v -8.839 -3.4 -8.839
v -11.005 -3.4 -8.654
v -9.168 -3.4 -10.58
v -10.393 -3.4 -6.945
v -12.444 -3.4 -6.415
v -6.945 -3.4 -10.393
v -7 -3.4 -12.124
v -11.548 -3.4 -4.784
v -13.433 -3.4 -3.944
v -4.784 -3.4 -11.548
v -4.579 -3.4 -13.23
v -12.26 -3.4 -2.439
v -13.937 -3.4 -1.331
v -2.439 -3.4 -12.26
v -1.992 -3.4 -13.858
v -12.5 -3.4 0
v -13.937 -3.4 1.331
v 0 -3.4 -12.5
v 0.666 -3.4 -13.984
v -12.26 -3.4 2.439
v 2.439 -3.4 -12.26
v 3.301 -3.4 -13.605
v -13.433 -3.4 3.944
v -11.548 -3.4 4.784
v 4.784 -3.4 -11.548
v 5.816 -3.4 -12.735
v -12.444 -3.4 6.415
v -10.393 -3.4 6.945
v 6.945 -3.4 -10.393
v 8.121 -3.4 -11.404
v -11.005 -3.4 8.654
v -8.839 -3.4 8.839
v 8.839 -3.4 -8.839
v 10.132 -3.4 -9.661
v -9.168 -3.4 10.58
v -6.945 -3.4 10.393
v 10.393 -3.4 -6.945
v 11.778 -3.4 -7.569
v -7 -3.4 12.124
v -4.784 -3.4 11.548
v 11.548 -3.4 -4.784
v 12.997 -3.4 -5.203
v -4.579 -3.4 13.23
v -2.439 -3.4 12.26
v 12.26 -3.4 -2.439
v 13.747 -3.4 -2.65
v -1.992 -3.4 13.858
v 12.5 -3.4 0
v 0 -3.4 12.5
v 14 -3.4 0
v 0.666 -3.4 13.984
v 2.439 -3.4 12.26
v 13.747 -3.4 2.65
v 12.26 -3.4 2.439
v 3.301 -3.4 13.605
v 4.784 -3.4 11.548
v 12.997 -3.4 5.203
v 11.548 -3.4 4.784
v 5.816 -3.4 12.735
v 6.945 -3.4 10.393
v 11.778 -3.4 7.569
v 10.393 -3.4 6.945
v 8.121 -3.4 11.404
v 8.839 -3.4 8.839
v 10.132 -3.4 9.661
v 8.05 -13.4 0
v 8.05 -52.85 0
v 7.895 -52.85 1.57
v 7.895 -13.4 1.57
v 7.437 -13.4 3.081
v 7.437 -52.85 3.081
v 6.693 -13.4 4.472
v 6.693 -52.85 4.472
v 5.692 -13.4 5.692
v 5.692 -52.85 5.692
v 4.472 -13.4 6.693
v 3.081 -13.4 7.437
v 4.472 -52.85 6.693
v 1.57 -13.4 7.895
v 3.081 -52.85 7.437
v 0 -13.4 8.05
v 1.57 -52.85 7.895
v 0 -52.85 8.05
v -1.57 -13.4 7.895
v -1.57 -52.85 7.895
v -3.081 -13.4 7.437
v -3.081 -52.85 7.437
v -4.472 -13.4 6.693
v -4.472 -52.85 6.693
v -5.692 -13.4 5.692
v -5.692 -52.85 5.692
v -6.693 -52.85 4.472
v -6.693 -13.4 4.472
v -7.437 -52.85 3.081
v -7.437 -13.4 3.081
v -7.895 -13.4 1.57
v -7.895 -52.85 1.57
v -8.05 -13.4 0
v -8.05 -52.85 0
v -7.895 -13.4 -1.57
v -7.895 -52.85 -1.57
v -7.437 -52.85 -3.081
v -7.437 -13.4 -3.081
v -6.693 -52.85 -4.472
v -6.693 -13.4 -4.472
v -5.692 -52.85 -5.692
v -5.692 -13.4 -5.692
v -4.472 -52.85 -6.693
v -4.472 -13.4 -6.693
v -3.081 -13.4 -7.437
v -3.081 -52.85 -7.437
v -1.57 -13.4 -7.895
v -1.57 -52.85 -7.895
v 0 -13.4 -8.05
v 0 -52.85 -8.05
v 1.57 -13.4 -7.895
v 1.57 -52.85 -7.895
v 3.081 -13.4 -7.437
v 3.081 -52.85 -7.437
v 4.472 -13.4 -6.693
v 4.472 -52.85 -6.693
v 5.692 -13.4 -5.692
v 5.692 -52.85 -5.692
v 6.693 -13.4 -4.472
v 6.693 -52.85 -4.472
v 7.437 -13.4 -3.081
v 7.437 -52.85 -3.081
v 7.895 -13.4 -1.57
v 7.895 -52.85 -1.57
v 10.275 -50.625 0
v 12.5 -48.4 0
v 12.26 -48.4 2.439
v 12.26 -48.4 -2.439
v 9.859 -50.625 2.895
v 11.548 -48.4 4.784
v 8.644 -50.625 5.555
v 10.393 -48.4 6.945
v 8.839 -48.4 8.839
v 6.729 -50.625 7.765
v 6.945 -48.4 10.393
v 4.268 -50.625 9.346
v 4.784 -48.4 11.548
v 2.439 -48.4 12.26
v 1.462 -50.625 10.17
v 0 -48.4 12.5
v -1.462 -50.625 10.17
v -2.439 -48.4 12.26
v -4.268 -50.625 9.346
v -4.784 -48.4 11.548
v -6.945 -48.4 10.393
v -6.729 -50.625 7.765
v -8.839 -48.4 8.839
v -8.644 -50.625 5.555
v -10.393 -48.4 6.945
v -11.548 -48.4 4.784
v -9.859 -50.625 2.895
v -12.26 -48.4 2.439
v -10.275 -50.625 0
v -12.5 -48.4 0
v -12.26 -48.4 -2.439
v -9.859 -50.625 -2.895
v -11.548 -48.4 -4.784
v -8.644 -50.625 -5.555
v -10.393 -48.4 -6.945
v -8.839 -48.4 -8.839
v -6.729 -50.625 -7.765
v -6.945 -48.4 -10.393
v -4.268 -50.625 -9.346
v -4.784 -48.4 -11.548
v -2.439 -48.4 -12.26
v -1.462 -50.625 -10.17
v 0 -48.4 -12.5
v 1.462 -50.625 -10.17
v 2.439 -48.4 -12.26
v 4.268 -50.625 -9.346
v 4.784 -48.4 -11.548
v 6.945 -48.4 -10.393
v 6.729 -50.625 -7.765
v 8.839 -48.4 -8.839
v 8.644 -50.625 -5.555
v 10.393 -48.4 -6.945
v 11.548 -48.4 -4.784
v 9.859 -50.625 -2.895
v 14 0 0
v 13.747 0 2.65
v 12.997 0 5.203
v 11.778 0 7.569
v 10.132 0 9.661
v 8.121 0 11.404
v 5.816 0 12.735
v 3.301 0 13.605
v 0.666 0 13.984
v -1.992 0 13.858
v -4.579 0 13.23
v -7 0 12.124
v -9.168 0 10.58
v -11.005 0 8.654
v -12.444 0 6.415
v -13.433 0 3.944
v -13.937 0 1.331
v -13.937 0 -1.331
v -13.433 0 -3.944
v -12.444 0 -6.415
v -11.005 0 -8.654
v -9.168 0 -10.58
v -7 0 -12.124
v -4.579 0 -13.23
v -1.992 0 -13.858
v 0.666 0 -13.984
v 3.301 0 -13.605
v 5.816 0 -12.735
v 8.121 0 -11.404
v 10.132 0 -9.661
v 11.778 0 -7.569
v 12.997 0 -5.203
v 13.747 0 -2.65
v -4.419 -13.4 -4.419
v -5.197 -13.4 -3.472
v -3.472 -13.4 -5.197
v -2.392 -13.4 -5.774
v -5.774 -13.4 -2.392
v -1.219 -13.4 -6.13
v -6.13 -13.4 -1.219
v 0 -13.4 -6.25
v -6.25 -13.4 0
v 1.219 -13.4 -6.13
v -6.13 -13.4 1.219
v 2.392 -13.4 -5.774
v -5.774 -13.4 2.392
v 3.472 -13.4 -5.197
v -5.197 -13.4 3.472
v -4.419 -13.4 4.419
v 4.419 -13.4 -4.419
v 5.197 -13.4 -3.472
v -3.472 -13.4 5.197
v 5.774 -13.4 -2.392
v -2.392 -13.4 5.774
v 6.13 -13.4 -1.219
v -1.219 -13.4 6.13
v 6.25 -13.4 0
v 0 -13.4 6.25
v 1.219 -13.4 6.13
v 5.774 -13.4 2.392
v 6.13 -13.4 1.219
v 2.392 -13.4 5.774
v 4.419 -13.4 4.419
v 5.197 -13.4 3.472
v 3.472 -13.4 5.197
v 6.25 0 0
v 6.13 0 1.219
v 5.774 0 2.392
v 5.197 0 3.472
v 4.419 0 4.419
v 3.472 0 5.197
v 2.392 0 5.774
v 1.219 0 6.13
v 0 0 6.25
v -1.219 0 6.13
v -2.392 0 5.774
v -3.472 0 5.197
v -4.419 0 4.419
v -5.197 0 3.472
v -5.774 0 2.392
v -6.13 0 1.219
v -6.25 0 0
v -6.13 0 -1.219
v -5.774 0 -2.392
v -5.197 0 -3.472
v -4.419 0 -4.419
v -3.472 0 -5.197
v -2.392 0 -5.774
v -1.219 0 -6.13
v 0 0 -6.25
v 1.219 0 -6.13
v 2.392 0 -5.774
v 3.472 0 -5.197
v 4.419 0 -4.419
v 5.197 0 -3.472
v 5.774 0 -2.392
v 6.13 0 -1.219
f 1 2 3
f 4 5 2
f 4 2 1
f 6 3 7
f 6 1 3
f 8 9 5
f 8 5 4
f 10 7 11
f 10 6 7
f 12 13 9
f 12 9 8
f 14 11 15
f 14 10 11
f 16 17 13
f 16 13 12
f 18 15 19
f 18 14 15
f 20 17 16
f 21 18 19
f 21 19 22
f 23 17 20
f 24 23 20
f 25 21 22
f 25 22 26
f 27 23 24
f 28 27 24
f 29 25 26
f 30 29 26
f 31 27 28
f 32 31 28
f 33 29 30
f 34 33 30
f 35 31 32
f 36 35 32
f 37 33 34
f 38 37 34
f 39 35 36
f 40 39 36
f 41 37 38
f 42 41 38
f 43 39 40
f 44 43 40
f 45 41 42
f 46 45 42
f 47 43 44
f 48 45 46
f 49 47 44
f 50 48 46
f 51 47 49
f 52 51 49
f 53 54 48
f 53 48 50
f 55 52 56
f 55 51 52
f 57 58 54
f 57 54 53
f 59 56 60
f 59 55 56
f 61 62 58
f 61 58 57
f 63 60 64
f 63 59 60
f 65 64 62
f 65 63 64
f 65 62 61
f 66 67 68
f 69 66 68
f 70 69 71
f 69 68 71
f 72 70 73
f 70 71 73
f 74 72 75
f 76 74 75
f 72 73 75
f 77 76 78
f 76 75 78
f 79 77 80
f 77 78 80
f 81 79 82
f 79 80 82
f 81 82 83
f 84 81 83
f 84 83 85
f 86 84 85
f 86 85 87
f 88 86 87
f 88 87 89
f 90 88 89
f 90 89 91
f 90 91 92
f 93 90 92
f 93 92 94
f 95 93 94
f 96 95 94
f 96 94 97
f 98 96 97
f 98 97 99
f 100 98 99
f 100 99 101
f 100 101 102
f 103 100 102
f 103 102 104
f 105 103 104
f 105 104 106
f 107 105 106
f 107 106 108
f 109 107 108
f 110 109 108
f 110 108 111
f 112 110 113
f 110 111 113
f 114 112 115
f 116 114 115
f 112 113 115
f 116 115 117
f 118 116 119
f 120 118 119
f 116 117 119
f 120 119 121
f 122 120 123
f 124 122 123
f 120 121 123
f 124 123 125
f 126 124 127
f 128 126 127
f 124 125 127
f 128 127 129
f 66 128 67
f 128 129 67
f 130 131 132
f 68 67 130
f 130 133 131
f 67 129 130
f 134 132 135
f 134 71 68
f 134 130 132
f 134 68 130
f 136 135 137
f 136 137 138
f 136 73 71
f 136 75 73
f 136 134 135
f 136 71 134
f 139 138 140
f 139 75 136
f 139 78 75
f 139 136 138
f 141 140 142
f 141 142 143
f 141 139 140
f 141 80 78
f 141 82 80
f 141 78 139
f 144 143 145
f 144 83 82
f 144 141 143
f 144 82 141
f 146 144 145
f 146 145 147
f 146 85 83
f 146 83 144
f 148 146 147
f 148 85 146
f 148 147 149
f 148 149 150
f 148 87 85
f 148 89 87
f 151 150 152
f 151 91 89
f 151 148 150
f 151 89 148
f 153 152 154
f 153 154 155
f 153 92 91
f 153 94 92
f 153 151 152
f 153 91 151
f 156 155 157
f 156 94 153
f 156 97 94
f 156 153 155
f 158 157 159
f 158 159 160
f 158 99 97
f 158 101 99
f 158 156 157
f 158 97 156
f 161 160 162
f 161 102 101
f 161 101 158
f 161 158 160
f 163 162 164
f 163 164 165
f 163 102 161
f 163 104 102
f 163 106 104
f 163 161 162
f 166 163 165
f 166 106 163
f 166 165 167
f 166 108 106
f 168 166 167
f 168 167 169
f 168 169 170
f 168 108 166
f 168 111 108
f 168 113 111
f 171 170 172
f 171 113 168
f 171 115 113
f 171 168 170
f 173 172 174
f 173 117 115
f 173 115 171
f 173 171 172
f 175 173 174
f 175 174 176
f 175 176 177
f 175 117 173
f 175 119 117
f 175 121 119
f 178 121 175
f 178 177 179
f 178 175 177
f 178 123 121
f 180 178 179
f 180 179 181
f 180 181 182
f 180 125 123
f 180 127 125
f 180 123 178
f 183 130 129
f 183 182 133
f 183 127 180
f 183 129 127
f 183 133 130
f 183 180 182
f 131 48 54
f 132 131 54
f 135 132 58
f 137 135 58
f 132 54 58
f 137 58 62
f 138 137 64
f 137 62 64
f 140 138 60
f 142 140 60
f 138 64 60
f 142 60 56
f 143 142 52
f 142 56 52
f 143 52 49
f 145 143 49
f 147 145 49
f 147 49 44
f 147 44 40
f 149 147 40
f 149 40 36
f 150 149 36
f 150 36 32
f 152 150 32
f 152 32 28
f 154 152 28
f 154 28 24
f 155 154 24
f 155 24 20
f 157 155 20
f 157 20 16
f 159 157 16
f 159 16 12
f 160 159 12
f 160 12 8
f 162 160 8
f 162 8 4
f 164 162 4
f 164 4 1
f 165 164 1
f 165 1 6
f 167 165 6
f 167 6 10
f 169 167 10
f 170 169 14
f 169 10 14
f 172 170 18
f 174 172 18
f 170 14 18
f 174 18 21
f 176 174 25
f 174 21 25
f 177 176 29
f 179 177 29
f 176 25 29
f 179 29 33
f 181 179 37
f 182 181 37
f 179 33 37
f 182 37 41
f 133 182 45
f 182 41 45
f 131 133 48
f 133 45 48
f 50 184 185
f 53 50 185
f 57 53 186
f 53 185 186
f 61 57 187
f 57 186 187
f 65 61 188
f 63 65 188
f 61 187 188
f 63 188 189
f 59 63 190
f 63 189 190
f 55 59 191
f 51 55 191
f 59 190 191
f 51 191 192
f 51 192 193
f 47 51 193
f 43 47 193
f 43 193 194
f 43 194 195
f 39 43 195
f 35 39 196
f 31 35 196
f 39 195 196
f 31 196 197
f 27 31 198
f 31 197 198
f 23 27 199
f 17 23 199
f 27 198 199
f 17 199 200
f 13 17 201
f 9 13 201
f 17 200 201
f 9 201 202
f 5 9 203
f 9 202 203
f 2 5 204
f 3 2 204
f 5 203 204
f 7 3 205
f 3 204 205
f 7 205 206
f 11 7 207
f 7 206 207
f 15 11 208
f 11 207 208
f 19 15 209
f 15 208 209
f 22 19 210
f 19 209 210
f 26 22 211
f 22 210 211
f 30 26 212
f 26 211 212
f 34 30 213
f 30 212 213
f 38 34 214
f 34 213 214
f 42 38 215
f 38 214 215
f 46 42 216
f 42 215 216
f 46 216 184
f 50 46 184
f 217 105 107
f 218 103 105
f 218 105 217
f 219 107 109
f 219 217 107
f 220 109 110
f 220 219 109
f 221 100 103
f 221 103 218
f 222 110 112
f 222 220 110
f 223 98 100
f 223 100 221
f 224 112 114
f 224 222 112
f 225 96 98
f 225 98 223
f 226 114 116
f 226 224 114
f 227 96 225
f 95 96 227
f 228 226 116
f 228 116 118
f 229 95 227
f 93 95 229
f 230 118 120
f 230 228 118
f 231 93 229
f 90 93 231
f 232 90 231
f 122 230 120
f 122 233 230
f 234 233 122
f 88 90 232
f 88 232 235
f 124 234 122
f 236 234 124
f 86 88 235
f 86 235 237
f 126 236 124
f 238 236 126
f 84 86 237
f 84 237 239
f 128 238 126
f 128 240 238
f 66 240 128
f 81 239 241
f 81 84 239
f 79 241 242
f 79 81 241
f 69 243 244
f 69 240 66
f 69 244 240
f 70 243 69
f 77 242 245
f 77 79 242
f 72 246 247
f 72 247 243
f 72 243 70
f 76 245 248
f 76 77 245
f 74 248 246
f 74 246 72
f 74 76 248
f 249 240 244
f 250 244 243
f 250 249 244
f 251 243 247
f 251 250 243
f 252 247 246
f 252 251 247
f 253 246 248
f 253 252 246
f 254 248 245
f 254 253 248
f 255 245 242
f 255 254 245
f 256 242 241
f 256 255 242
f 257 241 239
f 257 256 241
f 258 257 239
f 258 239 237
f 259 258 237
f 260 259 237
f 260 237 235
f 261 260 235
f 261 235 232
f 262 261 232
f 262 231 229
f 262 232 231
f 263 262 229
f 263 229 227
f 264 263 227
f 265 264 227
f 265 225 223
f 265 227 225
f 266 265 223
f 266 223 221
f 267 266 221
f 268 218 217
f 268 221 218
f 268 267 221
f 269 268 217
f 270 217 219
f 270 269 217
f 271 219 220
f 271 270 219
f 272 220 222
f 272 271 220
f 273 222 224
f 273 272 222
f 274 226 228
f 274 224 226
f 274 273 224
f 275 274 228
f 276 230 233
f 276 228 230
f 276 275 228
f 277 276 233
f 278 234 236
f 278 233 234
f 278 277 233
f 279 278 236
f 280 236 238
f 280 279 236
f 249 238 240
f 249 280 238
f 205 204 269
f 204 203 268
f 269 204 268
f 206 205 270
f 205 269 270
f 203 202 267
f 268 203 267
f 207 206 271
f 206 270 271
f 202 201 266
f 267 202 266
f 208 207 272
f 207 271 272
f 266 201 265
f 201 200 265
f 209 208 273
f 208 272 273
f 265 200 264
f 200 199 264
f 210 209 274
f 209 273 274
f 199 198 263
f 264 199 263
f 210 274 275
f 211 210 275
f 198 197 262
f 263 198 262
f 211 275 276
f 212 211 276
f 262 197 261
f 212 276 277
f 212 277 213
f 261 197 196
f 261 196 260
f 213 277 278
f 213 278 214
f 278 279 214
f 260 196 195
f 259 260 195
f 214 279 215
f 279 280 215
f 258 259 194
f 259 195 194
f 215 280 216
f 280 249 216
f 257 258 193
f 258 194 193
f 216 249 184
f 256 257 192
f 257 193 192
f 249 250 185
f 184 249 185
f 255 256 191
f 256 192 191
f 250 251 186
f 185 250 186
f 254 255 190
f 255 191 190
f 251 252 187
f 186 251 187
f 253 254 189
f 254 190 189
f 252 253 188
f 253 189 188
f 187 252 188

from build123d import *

# Parameters (mm, degrees)
F0_R      = 14
F1_DEPTH  = 3.4
F3_R      = 12.5
F4_DEPTH  = 50
F6_R      = 8.05
F7_DEPTH  = 40
F9_R      = 6.25
F10_DEPTH = 66.1


# Not quite as in the source:
# - a fillet or chamfer that OpenCascade refuses, or shapes differently, is made with other operations: its cross-section is extruded or revolved along the edge and cut away or added


with BuildPart() as f1:
    # F0 (on Front) → F1 (new body)
    with BuildSketch(Plane.XZ):
        Circle(F0_R)
    extrude(amount=F1_DEPTH)

    # F3 (on offset) → F4 (join)
    with BuildSketch(Plane.XZ.offset(3.4)):
        Circle(F3_R)
    extrude(amount=F4_DEPTH)

    # F6 (on offset) → F7 (cut)
    with BuildSketch(Plane.XZ.offset(53.4)):
        Circle(F6_R)
    extrude(amount=-F7_DEPTH, mode=Mode.SUBTRACT)

    # F8: chamfer of 5 on 1 edges, made by hand

    # F8_s1 → F8_t2 (revolve, cut)
    with BuildSketch(Plane.XY):
        Polygon((12.5, -48.4), (7.5, -53.4), (12.5, -53.4), align=None)
    revolve(axis=Axis((0, -53.4, 0), (0, -1, 0)), mode=Mode.SUBTRACT)

    # F9 (on Front) → F10 (cut)
    with BuildSketch(Plane.XZ):
        Circle(F9_R)
    extrude(amount=F10_DEPTH, mode=Mode.SUBTRACT)


solid = f1.part
